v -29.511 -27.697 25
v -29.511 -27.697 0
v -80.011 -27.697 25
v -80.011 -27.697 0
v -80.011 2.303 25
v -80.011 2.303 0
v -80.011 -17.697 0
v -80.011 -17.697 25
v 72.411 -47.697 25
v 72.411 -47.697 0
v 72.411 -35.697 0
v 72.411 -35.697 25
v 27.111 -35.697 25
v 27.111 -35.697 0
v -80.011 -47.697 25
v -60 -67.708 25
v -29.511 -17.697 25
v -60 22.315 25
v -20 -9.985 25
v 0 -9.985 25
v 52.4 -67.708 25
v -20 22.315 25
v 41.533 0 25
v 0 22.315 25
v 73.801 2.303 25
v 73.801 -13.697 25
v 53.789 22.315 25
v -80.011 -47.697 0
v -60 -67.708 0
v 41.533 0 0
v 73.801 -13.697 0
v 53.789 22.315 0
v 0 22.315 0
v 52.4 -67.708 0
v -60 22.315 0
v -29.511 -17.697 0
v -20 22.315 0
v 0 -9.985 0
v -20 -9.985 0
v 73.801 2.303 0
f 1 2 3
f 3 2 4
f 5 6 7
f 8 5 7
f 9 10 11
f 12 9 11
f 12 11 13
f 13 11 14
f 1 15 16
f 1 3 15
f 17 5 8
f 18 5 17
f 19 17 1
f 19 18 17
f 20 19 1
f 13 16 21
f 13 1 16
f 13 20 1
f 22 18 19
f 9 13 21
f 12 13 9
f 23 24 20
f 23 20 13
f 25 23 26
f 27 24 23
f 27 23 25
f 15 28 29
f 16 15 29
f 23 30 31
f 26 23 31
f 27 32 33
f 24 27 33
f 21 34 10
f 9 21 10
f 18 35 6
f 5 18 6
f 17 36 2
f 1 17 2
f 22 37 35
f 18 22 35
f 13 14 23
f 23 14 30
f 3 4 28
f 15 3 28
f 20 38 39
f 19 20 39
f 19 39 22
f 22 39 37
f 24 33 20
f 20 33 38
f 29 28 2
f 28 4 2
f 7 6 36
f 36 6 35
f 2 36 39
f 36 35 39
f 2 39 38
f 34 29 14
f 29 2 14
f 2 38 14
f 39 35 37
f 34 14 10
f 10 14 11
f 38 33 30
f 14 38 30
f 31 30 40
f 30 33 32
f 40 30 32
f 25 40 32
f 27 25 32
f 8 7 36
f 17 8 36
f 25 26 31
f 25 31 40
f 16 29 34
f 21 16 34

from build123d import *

# Parameters (mm, degrees)
F1_DEPTH = 25
F2_DEPTH = 25


with BuildPart() as f1:
    # F0 (on Top) → F1 (new body)
    with BuildSketch(Plane.XY):
        Polygon((-80.011122, -47.696578), (-60, -67.7077), (52.4, -67.7077), (72.411122, -47.696578), (72.411122, -35.696578), (27.111122, -35.696578), (41.533476, 0), (73.800592, -13.696578), (73.800592, 2.303422), (53.78947, 22.314544), (0, 22.314544), (0, -9.985456), (-20, -9.985456), (-20, 22.314544), (-60, 22.314544), (-80.011122, 2.303422), (-80.011122, -17.696578), (-29.511122, -17.696578), (-29.511122, -27.696578), (-80.011122, -27.696578), align=None)
    extrude(amount=F1_DEPTH)

    # F0 (on Top) → F2 (join)
    with BuildSketch(Plane.XY):
        Polygon((-80.011122, -47.696578), (-60, -67.7077), (52.4, -67.7077), (72.411122, -47.696578), (72.411122, -35.696578), (27.111122, -35.696578), (41.533476, 0), (73.800592, -13.696578), (73.800592, 2.303422), (53.78947, 22.314544), (0, 22.314544), (0, -9.985456), (-20, -9.985456), (-20, 22.314544), (-60, 22.314544), (-80.011122, 2.303422), (-80.011122, -17.696578), (-29.511122, -17.696578), (-29.511122, -27.696578), (-80.011122, -27.696578), align=None)
    extrude(amount=F2_DEPTH)


solid = f1.part
